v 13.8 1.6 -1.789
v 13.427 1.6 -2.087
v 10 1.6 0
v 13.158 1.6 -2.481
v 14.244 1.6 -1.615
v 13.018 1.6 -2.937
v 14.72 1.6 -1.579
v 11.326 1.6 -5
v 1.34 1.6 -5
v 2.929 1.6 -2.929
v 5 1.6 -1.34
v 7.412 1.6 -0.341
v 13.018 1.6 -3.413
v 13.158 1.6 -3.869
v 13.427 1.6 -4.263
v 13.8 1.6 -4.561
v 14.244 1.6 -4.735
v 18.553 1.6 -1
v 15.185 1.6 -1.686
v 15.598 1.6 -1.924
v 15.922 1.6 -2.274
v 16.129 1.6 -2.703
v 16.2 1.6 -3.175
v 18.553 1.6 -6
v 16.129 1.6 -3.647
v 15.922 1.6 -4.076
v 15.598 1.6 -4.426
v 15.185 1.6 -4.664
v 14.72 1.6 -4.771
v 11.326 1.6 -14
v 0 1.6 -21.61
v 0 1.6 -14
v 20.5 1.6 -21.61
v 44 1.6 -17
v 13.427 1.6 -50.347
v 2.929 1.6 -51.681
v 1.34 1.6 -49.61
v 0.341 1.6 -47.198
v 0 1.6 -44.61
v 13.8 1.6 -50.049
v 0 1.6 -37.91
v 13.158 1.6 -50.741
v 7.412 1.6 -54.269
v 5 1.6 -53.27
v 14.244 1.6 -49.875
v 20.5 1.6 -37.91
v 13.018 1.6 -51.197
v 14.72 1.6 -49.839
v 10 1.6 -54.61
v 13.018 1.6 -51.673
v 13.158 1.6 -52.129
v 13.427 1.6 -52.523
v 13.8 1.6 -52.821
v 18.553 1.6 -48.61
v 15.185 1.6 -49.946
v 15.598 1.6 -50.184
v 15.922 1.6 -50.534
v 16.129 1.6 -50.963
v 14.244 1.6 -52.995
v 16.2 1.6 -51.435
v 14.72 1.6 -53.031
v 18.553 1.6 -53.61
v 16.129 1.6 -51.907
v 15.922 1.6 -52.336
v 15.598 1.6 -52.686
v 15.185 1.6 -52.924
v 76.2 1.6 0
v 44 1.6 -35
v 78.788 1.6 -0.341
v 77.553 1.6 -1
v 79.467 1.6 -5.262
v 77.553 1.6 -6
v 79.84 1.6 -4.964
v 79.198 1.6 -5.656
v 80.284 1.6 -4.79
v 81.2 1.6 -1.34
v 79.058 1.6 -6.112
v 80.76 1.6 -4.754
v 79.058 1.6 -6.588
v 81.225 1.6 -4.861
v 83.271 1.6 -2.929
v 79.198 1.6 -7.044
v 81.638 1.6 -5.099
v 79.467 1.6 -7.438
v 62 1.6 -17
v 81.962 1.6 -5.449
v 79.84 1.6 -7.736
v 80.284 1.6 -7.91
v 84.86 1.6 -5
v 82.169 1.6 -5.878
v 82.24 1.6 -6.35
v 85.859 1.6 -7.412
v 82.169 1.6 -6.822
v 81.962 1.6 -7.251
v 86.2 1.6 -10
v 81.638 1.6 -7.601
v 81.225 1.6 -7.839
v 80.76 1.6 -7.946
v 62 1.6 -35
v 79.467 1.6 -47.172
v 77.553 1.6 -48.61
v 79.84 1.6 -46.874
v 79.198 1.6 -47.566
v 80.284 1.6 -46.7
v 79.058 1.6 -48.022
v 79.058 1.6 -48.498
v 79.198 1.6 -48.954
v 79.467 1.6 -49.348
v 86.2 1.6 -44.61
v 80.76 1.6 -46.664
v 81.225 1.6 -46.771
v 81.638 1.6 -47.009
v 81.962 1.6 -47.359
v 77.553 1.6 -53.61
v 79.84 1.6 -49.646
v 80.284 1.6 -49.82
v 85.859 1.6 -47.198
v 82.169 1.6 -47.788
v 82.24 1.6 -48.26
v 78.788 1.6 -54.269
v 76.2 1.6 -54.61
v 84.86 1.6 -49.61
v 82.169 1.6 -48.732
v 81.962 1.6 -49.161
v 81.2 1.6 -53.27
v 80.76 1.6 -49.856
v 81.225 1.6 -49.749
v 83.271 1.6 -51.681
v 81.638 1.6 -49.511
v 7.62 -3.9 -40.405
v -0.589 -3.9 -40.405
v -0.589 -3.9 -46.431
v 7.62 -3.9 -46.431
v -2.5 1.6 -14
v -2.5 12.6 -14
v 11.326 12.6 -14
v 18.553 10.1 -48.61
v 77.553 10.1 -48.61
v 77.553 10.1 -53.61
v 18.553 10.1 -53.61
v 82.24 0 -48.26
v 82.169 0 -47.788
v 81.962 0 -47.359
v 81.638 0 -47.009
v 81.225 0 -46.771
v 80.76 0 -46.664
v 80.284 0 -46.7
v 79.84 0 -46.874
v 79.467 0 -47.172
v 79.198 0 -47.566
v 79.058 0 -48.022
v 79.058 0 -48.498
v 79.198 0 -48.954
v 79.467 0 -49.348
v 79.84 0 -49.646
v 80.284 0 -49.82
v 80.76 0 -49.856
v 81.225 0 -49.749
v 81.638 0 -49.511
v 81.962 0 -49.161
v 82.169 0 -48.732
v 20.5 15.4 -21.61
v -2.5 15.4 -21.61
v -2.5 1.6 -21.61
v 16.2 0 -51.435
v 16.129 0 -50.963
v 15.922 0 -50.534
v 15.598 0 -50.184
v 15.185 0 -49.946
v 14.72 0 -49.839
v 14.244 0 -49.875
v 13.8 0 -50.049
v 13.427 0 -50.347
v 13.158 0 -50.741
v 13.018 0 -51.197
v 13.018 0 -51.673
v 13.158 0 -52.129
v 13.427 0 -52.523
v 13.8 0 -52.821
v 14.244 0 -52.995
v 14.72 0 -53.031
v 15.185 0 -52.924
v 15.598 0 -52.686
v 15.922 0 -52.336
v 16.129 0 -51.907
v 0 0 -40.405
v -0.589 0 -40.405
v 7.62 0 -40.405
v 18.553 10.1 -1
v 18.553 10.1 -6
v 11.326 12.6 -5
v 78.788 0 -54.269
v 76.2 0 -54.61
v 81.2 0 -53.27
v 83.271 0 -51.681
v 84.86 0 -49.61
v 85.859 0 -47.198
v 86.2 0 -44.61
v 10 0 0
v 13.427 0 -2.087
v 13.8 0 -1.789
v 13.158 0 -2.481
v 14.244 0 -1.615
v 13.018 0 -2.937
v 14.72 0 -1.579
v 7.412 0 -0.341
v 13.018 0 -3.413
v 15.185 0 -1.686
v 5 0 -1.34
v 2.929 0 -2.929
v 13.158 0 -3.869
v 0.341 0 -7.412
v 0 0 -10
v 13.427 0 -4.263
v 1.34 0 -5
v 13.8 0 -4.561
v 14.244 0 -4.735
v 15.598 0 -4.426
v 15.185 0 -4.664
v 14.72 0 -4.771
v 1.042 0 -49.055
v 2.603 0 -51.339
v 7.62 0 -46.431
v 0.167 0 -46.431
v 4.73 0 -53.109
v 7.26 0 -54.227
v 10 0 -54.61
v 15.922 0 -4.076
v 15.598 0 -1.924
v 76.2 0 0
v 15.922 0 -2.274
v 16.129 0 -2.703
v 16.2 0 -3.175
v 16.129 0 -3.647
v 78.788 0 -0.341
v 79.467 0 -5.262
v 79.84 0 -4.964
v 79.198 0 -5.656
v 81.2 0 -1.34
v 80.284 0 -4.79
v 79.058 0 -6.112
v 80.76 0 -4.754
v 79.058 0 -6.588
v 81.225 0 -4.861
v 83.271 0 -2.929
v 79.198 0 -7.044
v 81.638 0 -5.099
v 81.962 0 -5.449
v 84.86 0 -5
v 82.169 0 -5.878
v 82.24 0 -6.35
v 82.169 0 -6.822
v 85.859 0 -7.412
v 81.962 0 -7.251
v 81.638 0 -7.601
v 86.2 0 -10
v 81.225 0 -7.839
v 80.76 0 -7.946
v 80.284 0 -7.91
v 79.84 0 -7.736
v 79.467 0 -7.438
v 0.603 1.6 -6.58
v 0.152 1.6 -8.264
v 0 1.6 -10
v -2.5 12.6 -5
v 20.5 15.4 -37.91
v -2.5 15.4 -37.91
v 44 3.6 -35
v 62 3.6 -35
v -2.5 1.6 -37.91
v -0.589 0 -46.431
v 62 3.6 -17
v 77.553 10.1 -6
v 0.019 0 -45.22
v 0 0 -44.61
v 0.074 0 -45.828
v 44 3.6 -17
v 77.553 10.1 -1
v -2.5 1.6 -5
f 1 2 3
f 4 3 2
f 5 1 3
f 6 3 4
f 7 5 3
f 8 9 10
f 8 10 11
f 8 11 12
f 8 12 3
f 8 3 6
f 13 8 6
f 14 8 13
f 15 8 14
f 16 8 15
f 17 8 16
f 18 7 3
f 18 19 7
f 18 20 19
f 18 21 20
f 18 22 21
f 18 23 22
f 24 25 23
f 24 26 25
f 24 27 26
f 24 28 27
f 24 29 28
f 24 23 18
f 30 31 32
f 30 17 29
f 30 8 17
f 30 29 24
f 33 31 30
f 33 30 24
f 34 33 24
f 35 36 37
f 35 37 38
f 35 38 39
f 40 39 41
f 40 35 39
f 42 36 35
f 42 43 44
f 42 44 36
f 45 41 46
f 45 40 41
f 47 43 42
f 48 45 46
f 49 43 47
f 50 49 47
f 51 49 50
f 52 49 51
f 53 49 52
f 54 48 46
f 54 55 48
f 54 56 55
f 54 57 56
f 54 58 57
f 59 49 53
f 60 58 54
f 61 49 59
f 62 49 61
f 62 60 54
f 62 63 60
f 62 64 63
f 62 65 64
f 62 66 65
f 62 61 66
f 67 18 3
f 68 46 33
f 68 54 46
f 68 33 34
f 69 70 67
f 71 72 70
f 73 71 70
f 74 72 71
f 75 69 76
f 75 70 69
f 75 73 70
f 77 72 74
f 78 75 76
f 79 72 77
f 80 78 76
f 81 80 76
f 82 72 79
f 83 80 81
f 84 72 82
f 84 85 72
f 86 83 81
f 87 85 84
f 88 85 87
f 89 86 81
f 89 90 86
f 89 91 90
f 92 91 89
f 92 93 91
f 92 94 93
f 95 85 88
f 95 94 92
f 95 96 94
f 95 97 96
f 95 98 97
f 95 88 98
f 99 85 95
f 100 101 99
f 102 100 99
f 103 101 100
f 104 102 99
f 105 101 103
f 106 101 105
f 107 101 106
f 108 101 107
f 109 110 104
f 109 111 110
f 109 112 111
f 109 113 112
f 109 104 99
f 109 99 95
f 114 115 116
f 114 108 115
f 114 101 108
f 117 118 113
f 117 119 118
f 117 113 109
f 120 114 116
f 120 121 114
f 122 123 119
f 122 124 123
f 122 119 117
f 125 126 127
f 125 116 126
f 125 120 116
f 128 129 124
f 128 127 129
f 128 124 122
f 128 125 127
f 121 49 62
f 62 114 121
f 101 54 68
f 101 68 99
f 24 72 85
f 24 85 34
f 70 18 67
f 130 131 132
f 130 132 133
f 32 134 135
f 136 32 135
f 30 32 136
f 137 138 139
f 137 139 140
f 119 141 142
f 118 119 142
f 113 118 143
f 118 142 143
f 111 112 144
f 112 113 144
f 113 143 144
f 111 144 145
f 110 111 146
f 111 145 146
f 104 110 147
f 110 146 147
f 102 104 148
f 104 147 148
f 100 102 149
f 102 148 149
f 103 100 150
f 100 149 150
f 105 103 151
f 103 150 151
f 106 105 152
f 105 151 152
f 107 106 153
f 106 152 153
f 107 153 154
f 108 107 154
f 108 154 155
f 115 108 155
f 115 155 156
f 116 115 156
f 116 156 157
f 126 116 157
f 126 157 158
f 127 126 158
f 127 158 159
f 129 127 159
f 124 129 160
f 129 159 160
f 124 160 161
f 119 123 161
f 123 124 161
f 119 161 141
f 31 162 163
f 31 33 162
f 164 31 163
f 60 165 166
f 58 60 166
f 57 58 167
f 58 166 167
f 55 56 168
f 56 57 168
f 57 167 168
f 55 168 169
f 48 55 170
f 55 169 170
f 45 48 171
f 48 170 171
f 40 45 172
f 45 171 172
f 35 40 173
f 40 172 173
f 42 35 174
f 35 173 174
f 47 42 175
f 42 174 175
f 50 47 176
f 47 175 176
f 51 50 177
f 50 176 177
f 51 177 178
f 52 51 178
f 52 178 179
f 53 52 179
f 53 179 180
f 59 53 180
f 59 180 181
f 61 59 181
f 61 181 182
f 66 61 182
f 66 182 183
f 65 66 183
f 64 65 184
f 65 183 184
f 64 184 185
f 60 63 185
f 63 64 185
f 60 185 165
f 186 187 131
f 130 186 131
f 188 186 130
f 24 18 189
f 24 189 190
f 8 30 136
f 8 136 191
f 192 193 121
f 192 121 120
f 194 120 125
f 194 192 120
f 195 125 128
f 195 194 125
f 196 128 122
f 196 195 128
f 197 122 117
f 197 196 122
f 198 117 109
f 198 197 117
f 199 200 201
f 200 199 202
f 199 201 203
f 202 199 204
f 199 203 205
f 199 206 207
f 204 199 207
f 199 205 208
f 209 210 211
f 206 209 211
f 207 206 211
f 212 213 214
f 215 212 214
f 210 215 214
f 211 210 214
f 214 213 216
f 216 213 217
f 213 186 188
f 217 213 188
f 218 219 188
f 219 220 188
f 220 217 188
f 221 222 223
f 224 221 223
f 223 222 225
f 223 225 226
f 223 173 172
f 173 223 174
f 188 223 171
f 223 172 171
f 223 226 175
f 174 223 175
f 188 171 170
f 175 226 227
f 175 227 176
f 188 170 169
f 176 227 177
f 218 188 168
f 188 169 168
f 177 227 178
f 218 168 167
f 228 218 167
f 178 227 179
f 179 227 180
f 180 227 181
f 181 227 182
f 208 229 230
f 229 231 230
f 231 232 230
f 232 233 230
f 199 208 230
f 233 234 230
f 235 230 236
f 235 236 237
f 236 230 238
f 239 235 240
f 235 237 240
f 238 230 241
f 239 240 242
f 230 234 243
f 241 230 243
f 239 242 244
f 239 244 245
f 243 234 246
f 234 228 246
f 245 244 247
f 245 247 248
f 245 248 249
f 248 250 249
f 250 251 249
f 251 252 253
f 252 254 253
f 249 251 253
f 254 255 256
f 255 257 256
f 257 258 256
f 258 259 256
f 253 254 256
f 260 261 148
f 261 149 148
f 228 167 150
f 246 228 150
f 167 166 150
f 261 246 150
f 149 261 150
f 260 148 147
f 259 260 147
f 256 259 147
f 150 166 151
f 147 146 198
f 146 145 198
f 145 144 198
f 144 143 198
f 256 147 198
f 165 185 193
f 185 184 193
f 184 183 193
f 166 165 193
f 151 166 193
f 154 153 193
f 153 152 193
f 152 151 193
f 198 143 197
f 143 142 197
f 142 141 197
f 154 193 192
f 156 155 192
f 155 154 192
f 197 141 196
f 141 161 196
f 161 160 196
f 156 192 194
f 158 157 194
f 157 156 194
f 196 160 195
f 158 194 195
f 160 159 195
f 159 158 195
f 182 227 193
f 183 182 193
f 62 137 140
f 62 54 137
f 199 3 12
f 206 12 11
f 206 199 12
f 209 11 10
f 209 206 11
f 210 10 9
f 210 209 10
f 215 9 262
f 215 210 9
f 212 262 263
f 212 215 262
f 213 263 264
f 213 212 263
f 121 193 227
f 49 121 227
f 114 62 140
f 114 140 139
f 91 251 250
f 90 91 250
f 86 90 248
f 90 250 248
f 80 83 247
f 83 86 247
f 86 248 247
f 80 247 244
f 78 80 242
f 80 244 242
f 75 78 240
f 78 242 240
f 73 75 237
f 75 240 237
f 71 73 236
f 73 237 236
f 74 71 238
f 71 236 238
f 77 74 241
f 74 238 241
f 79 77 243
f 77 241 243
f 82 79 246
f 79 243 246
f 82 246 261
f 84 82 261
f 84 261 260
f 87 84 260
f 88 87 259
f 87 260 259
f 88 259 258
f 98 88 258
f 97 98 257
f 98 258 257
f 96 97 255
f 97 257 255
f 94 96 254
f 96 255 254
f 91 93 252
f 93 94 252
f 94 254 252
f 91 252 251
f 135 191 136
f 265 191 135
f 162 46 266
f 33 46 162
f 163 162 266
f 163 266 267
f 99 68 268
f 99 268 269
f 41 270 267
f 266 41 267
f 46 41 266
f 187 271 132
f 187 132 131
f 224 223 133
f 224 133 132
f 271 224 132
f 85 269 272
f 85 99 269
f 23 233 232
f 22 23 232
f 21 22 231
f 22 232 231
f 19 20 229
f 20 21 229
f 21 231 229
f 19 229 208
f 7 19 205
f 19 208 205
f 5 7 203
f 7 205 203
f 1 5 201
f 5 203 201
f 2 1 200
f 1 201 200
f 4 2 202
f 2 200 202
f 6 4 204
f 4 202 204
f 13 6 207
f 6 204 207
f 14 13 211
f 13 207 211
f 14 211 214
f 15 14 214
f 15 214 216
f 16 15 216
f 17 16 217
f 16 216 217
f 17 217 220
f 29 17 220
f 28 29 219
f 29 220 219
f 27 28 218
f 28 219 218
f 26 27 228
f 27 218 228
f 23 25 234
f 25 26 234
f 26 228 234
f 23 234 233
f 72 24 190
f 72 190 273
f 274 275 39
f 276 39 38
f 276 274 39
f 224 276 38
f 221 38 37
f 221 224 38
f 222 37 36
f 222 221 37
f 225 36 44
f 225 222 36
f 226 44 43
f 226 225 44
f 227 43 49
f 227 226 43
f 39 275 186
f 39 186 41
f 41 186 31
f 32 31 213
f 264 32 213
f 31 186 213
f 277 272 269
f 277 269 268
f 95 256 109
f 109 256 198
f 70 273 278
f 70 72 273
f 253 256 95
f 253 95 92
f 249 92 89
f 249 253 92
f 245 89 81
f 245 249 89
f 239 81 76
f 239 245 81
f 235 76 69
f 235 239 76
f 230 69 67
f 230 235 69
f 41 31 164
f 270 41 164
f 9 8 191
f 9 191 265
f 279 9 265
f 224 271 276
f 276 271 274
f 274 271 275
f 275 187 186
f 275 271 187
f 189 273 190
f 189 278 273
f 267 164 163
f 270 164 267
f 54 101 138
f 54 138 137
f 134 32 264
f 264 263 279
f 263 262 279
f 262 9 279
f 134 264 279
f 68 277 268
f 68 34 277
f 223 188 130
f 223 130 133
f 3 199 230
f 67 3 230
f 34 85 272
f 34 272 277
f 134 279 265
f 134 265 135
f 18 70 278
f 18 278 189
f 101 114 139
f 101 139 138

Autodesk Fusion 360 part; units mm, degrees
sketch "Sketch1" plane through (0, 0, 0) normal (0, 1, 0) x (1, 0, 0)
  line L0 (10, 0) -> (76.2, 0)
  line L1 (86.2, 10) -> (86.2, 44.61)
  line L2 (76.2, 54.61) -> (10, 54.61)
  line L3 (0, 44.61) -> (0, 10)
  circle A0 centre (14.6, 51.435) radius 1.6
  circle A1 centre (14.6, 3.175) radius 1.6
  circle A2 centre (80.64, 48.26) radius 1.6
  circle A3 centre (80.64, 6.35) radius 1.6
  arc A4 (0, 10) -> (10, 0) centre (10, 10) ccw
  arc A5 (10, 54.61) -> (0, 44.61) centre (10, 44.61) ccw
  arc A6 (86.2, 44.61) -> (76.2, 54.61) centre (76.2, 44.61) ccw
  arc A7 (76.2, 0) -> (86.2, 10) centre (76.2, 10) ccw
  dimension "d1" = 86.2
  dimension "d2" = 54.61
  dimension "d3" = 3.2
  dimension "d4" = 14.6
  dimension "d5" = 3.175
  dimension "d6" = 48.26
  dimension "d8" = 41.91
  dimension "d10" = 6.35
  dimension "d11" = 65.9
  dimension "d12" = 66.04
  dimension "d13" = 10
  dimension "d36" = 3.11
extrude "Extrude1" add sketch "Sketch1" along normal blind 1.6
sketch "Sketch2" plane through (0, 1.6, 0) normal (0, 1, 0) x (-1, 0, 0)
  circle A0 centre (-14.6, -3.175) radius 1.6
  circle A1 centre (-80.64, -6.35) radius 1.6
  circle A2 centre (-14.6, -51.435) radius 1.6
  circle A3 centre (-80.64, -48.26) radius 1.6
  arc A4 (-76.2, 0) -> (-86.2, -10) centre (-76.2, -10) ccw
  line L0 (-86.2, -10) -> (-86.2, -44.61)
  arc A5 (-86.2, -44.61) -> (-76.2, -54.61) centre (-76.2, -44.61) ccw
  line L1 (-76.2, -54.61) -> (-10, -54.61)
  arc A6 (-10, -54.61) -> (0, -44.61) centre (-10, -44.61) ccw
  line L2 (0, -44.61) -> (0, -10)
  arc A7 (0, -10) -> (-10, 0) centre (-10, -10) ccw
  line L3 (-10, 0) -> (-76.2, 0)
  line L4 (-18.553, -6) -> (-77.553, -6)
  line L5 (-77.553, -6) -> (-77.553, -1)
  line L6 (-77.553, -1) -> (-18.553, -1)
  line L7 (-18.553, -1) -> (-18.553, -6)
  line L8 (-18.553, -53.61) -> (-77.553, -53.61)
  line L9 (-77.553, -53.61) -> (-77.553, -48.61)
  line L10 (-77.553, -48.61) -> (-18.553, -48.61)
  line L11 (-18.553, -48.61) -> (-18.553, -53.61)
  dimension "d16" = 59
  dimension "d17" = 1
  dimension "d18" = 1
  dimension "d19" = 5
extrude "Extrude2" add sketch "Sketch2" along normal blind 8.5 contours L4 L5 L6 L7 | L8 L9 L10 L11
sketch "Sketch3" plane through (0, 1.6, 0) normal (0, 1, 0) x (-1, 0, 0)
  line L0 (-18.553, -1) -> (-18.553, -6)
  line L1 (-18.553, -6) -> (-77.553, -6)
  line L2 (-77.553, -6) -> (-77.553, -1)
  line L3 (-77.553, -1) -> (-18.553, -1)
  line L4 (-18.553, -48.61) -> (-18.553, -53.61)
  line L5 (-18.553, -53.61) -> (-77.553, -53.61)
  line L6 (-77.553, -53.61) -> (-77.553, -48.61)
  line L7 (-77.553, -48.61) -> (-18.553, -48.61)
  circle A0 centre (-14.6, -3.175) radius 1.6
  circle A1 centre (-80.64, -6.35) radius 1.6
  circle A2 centre (-14.6, -51.435) radius 1.6
  circle A3 centre (-80.64, -48.26) radius 1.6
  arc A4 (-76.2, 0) -> (-86.2, -10) centre (-76.2, -10) ccw
  line L8 (-86.2, -10) -> (-86.2, -44.61)
  arc A5 (-86.2, -44.61) -> (-76.2, -54.61) centre (-76.2, -44.61) ccw
  line L9 (-76.2, -54.61) -> (-10, -54.61)
  arc A6 (-10, -54.61) -> (0, -44.61) centre (-10, -44.61) ccw
  line L10 (0, -44.61) -> (0, -10)
  arc A7 (0, -10) -> (-10, 0) centre (-10, -10) ccw
  line L11 (-10, 0) -> (-76.2, 0)
  line L12 (2.5, -37.91) -> (-20.5, -37.91)
  line L13 (-20.5, -37.91) -> (-20.5, -21.61)
  line L14 (-20.5, -21.61) -> (2.5, -21.61)
  line L15 (2.5, -21.61) -> (2.5, -37.91)
  dimension "d22" = 16.3
  dimension "d23" = 16.7
  dimension "d24" = 2.5
extrude "Extrude3" add sketch "Sketch3" along normal blind 13.8 contours L10 L12 L14 L15 | L10 L12 L13 L14
sketch "Sketch4" plane through (0, 1.6, 0) normal (0, 1, 0) x (-1, 0, 0)
  line L0 (-20.5, -21.61) -> (0, -21.61)
  line L1 (0, -21.61) -> (0, -10)
  arc A0 (0, -10) -> (-10, 0) centre (-10, -10) ccw
  line L2 (-10, 0) -> (-76.2, 0)
  arc A1 (-76.2, 0) -> (-86.2, -10) centre (-76.2, -10) ccw
  line L3 (-86.2, -10) -> (-86.2, -44.61)
  arc A2 (-86.2, -44.61) -> (-76.2, -54.61) centre (-76.2, -44.61) ccw
  line L4 (-76.2, -54.61) -> (-10, -54.61)
  arc A3 (-10, -54.61) -> (0, -44.61) centre (-10, -44.61) ccw
  line L5 (0, -44.61) -> (0, -37.91)
  line L6 (0, -37.91) -> (-20.5, -37.91)
  line L7 (-20.5, -37.91) -> (-20.5, -21.61)
  line L8 (-18.553, -1) -> (-18.553, -6)
  line L9 (-18.553, -6) -> (-77.553, -6)
  line L10 (-77.553, -6) -> (-77.553, -1)
  line L11 (-77.553, -1) -> (-18.553, -1)
  line L12 (-18.553, -48.61) -> (-18.553, -53.61)
  line L13 (-18.553, -53.61) -> (-77.553, -53.61)
  line L14 (-77.553, -53.61) -> (-77.553, -48.61)
  line L15 (-77.553, -48.61) -> (-18.553, -48.61)
  circle A4 centre (-14.6, -3.175) radius 1.6
  circle A5 centre (-80.64, -6.35) radius 1.6
  circle A6 centre (-14.6, -51.435) radius 1.6
  circle A7 centre (-80.64, -48.26) radius 1.6
  line L16 (2.5, -14) -> (-11.3258, -14)
  line L17 (-11.3258, -14) -> (-11.3258, -5)
  line L18 (-11.3258, -5) -> (2.5, -5)
  line L19 (2.5, -5) -> (2.5, -14)
  dimension "d27" = 9
  dimension "d28" = 5
extrude "Extrude4" add sketch "Sketch4" along normal blind 11 contours L1 A0 L16 L17 L18 | L1 A0 L16 L18 L19
sketch "Sketch5" plane through (0, 0, 0) normal (0, -1, 0) x (1, 0, 0)
  circle A0 centre (14.6, -3.175) radius 1.6
  circle A1 centre (80.64, -6.35) radius 1.6
  circle A2 centre (14.6, -51.435) radius 1.6
  circle A3 centre (80.64, -48.26) radius 1.6
  arc A4 (86.2, -10) -> (76.2, 0) centre (76.2, -10) ccw
  line L0 (76.2, 0) -> (10, 0)
  arc A5 (10, 0) -> (0, -10) centre (10, -10) ccw
  line L1 (0, -10) -> (0, -44.61)
  arc A6 (0, -44.61) -> (10, -54.61) centre (10, -44.61) ccw
  line L2 (10, -54.61) -> (76.2, -54.61)
  arc A7 (76.2, -54.61) -> (86.2, -44.61) centre (76.2, -44.61) ccw
  line L3 (86.2, -44.61) -> (86.2, -10)
  line L4 (-0.5891, -40.4049) -> (7.6203, -40.4049)
  line L5 (7.6203, -40.4049) -> (7.6203, -46.4306)
  line L6 (7.6203, -46.4306) -> (-0.5891, -46.4306)
  line L7 (-0.5891, -46.4306) -> (-0.5891, -40.4049)
extrude "Extrude5" add sketch "Sketch5" along normal blind 3.9 contours L1 A6 L4 L5 L6 | L1 A6 L4 L6 L7
sketch "Sketch6" plane through (0, 1.6, 0) normal (0, 1, 0) x (-1, 0, 0)
  line L0 (-11.3258, -5) -> (-1.3397, -5)
  arc A0 (-1.3397, -5) -> (-10, 0) centre (-10, -10) ccw
  line L1 (-10, 0) -> (-76.2, 0)
  arc A1 (-76.2, 0) -> (-86.2, -10) centre (-76.2, -10) ccw
  line L2 (-86.2, -10) -> (-86.2, -44.61)
  arc A2 (-86.2, -44.61) -> (-76.2, -54.61) centre (-76.2, -44.61) ccw
  line L3 (-76.2, -54.61) -> (-10, -54.61)
  arc A3 (-10, -54.61) -> (0, -44.61) centre (-10, -44.61) ccw
  line L4 (0, -44.61) -> (0, -37.91)
  line L5 (0, -37.91) -> (-20.5, -37.91)
  line L6 (-20.5, -37.91) -> (-20.5, -21.61)
  line L7 (-20.5, -21.61) -> (0, -21.61)
  line L8 (0, -21.61) -> (0, -14)
  line L9 (0, -14) -> (-11.3258, -14)
  line L10 (-11.3258, -14) -> (-11.3258, -5)
  line L11 (-18.553, -1) -> (-18.553, -6)
  line L12 (-18.553, -6) -> (-77.553, -6)
  line L13 (-77.553, -6) -> (-77.553, -1)
  line L14 (-77.553, -1) -> (-18.553, -1)
  line L15 (-18.553, -48.61) -> (-18.553, -53.61)
  line L16 (-18.553, -53.61) -> (-77.553, -53.61)
  line L17 (-77.553, -53.61) -> (-77.553, -48.61)
  line L18 (-77.553, -48.61) -> (-18.553, -48.61)
  circle A4 centre (-14.6, -3.175) radius 1.6
  circle A5 centre (-80.64, -6.35) radius 1.6
  circle A6 centre (-14.6, -51.435) radius 1.6
  circle A7 centre (-80.64, -48.26) radius 1.6
  line L19 (-44, -35) -> (-62, -35)
  line L20 (-62, -35) -> (-62, -17)
  line L21 (-62, -17) -> (-44, -17)
  line L22 (-44, -17) -> (-44, -35)
  dimension "d33" = 18
extrude "Extrude6" add sketch "Sketch6" along normal blind 2 contours L19 L20 L21 L22
